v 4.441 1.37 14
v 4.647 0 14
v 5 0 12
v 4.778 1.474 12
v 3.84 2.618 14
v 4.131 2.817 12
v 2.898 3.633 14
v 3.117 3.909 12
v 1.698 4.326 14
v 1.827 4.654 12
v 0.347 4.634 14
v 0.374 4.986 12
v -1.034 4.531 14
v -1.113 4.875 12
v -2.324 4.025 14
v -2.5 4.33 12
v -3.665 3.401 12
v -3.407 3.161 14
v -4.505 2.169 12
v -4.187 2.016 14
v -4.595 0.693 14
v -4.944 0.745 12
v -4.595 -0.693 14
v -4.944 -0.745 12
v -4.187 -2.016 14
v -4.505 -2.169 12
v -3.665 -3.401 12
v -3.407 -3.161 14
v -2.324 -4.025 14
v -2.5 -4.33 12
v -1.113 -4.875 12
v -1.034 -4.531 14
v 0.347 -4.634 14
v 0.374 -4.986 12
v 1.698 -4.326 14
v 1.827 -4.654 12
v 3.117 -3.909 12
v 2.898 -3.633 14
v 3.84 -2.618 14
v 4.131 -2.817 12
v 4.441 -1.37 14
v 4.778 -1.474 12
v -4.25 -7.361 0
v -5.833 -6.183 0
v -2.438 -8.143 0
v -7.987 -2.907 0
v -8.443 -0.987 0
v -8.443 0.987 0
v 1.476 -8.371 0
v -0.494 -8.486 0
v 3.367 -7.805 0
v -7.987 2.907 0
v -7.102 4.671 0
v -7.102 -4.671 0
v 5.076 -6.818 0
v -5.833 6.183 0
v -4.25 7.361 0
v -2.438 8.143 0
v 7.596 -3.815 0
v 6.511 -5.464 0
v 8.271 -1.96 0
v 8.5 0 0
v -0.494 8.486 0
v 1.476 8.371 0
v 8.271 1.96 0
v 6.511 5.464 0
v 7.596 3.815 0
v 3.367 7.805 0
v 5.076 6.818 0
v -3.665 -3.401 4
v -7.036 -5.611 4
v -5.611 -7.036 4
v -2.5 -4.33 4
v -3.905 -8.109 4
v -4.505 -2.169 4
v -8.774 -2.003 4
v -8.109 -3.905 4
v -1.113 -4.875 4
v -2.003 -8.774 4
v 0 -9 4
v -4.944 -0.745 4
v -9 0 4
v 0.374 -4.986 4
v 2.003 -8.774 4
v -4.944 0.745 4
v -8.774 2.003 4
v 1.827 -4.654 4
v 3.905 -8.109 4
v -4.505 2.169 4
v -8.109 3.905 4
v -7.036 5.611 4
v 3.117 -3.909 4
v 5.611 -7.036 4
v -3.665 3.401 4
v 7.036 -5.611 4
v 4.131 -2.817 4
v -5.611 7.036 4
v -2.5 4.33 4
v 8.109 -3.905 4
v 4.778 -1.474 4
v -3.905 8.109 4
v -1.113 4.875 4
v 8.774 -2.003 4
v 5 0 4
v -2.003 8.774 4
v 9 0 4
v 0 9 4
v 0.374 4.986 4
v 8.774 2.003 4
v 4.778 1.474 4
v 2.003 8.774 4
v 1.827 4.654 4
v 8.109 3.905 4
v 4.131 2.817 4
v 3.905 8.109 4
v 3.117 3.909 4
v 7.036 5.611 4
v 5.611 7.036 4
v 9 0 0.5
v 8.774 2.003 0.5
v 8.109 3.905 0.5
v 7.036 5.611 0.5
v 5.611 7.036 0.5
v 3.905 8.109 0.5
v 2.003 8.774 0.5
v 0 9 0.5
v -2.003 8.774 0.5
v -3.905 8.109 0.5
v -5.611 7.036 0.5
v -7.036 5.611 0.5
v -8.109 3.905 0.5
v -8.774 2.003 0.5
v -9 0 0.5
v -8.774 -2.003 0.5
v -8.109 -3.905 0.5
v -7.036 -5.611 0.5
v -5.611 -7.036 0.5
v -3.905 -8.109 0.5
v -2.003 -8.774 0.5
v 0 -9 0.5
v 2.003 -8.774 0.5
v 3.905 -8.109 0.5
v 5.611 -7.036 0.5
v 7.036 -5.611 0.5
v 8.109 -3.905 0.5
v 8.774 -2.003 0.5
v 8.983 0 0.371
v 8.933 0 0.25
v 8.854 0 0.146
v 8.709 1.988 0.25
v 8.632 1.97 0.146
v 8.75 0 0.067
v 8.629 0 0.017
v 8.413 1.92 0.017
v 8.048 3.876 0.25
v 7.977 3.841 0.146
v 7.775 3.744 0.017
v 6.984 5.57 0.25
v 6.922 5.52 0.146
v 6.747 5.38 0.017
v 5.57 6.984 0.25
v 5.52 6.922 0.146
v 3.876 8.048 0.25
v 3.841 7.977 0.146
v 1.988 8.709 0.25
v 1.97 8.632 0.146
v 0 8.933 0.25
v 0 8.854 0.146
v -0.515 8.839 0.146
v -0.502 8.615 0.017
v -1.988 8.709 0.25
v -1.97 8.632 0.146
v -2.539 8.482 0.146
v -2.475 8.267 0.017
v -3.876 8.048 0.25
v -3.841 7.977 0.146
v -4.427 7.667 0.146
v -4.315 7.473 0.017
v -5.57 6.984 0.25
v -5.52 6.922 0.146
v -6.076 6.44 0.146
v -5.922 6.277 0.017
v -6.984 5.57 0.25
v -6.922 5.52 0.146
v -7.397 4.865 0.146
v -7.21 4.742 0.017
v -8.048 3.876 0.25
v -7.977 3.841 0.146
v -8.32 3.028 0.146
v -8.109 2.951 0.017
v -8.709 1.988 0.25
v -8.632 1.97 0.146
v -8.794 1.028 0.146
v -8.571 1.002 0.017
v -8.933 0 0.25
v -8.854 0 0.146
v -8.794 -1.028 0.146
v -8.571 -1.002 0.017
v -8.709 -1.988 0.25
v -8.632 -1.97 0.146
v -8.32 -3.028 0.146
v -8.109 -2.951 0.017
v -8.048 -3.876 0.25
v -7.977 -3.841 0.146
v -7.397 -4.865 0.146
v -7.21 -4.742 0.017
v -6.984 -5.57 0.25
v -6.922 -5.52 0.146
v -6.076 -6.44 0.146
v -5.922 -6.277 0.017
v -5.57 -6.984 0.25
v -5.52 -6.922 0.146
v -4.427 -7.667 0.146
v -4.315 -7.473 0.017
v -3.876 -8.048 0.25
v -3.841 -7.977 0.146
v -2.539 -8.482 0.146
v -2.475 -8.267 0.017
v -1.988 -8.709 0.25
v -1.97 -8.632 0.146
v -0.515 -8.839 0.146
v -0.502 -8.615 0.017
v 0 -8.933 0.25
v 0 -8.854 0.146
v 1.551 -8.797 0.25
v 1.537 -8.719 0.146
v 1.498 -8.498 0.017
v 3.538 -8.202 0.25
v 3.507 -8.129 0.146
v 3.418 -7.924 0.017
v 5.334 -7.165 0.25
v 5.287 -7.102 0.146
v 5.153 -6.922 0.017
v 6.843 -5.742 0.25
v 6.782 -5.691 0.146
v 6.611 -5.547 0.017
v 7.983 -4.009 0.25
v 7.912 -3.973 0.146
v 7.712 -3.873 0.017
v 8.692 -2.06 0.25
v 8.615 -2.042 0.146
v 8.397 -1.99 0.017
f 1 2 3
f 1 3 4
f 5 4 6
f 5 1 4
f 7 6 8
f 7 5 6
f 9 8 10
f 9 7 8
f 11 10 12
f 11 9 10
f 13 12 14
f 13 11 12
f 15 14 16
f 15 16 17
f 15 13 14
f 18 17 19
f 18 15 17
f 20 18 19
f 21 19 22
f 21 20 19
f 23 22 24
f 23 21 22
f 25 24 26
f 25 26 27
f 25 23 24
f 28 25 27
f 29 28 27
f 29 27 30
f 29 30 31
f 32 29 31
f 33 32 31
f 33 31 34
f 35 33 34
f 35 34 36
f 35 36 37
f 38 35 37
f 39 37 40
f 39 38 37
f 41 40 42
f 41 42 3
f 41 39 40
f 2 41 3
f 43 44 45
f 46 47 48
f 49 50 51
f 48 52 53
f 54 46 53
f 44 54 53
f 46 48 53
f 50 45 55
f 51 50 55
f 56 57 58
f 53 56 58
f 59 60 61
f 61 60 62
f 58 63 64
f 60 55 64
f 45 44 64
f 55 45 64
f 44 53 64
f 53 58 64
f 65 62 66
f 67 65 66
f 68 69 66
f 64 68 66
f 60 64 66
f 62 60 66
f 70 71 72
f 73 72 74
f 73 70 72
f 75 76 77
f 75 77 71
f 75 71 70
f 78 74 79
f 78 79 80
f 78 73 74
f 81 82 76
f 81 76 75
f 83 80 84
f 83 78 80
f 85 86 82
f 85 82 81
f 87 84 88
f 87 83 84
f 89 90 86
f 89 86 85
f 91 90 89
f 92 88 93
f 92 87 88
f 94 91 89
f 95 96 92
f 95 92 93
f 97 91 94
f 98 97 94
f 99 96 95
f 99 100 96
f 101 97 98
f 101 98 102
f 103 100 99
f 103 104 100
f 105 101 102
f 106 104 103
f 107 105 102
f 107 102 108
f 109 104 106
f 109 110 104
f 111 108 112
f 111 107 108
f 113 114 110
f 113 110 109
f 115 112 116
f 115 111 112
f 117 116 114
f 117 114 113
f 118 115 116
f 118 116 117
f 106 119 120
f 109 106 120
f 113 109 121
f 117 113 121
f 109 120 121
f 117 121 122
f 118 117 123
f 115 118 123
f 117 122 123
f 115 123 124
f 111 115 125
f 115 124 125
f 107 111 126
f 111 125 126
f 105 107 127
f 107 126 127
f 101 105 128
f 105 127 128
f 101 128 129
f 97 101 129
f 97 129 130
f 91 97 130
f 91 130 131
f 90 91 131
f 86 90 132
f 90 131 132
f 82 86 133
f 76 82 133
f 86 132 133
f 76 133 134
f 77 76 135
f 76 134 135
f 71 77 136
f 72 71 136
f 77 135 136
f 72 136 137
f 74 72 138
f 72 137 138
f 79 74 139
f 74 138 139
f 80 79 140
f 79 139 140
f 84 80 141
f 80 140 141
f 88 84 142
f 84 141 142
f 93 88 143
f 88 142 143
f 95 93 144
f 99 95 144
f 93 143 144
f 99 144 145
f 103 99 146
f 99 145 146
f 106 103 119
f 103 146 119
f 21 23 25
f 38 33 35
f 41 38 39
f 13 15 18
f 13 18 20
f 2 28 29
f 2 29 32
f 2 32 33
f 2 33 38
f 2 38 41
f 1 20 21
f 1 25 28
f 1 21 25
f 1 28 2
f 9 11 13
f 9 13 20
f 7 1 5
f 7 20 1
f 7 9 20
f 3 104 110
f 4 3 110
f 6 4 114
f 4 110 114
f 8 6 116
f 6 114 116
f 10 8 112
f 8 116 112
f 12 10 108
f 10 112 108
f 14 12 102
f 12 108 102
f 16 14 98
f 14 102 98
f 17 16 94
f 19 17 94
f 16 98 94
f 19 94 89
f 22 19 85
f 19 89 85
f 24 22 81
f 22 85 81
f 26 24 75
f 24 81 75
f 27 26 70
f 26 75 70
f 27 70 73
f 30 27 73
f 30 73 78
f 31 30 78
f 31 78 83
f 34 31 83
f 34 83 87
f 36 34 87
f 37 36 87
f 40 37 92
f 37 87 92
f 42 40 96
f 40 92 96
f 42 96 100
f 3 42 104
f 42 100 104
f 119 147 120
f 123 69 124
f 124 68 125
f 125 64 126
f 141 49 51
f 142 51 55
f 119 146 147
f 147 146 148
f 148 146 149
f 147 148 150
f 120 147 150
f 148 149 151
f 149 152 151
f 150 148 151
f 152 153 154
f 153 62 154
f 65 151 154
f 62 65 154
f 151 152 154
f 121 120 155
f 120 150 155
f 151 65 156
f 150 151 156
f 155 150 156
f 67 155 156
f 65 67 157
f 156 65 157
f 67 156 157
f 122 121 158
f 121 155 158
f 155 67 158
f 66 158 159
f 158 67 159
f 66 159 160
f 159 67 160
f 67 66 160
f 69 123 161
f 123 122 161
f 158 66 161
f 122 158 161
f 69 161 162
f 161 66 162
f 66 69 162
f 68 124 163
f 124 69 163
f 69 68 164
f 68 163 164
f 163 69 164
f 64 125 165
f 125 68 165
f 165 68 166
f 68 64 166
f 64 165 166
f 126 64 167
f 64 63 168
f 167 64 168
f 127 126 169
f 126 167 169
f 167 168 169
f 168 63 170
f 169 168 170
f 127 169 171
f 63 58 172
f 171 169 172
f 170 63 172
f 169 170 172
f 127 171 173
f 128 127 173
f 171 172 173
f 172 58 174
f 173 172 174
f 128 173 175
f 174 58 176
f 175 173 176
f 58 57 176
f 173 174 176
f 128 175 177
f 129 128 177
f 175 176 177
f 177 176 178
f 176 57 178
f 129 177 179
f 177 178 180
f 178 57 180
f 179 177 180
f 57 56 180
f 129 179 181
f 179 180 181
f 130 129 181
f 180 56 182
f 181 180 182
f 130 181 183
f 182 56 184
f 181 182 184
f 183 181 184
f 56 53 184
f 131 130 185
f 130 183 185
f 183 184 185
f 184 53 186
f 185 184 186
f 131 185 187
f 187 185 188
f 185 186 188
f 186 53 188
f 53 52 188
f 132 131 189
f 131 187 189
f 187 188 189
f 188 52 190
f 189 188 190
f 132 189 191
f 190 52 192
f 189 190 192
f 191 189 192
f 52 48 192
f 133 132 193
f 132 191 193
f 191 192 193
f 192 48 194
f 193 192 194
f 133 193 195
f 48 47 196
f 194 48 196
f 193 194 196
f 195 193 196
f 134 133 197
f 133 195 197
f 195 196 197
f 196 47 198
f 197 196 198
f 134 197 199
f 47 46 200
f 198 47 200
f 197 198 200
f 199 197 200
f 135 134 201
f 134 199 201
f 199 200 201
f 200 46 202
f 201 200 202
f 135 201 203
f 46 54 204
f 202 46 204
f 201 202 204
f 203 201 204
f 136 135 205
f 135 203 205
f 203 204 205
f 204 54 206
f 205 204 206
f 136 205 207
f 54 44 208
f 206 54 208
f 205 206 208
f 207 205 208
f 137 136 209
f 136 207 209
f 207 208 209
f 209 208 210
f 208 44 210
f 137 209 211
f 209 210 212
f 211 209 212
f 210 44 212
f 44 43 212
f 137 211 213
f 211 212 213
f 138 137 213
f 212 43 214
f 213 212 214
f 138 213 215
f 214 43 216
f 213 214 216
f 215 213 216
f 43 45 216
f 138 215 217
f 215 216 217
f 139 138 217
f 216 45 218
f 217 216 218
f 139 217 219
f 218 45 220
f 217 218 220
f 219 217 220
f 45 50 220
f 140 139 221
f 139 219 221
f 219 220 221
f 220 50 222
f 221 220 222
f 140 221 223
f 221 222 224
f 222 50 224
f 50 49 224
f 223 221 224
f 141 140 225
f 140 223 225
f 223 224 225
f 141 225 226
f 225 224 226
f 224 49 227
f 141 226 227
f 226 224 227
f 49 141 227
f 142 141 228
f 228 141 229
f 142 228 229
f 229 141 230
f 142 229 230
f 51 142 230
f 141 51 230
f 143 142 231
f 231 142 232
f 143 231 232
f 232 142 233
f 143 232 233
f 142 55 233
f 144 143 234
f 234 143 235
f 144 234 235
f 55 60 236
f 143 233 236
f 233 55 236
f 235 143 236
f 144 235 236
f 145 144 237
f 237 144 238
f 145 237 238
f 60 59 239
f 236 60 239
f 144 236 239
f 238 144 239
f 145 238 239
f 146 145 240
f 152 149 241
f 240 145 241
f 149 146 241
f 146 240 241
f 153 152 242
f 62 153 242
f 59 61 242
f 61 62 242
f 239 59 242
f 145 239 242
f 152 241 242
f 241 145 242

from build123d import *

# Parameters (mm, degrees)
SKETCH_1_R      = 9
EXTRUDE_1_DEPTH = 4
SKETCH_2_R      = 5
EXTRUDE_2_DEPTH = 10
FILLET_1_R      = 0.5
CHAMFER_1_SIZE  = 2
CHAMFER_1_SIZE2 = 0.352653961


with BuildPart() as part:
    # 草图1 → 凸台-拉伸1 (new body)
    with BuildSketch(Plane.XY):
        Circle(SKETCH_1_R)
    extrude(amount=EXTRUDE_1_DEPTH)

    # 草图2 → 凸台-拉伸2 (add)
    with BuildSketch(Plane.XY.offset(4)):
        Circle(SKETCH_2_R)
    extrude(amount=EXTRUDE_2_DEPTH)

    # 圆角1
    fillet_1_edges = [part.edges().sort_by_distance(p)[0] for p in [
        (-9, 0, 0),
    ]]
    fillet(fillet_1_edges, radius=FILLET_1_R)

    # 倒角1
    chamfer_1_edges = [part.edges().sort_by_distance(p)[0] for p in [
        (-5, 0, 14),
    ]]
    chamfer_1_side = [part.faces().sort_by_distance(p)[0] for p in [
        (-5, 0, 9),
    ]]
    chamfer(chamfer_1_edges, length=CHAMFER_1_SIZE, length2=CHAMFER_1_SIZE2, reference=chamfer_1_side[0])


solid = part.part
